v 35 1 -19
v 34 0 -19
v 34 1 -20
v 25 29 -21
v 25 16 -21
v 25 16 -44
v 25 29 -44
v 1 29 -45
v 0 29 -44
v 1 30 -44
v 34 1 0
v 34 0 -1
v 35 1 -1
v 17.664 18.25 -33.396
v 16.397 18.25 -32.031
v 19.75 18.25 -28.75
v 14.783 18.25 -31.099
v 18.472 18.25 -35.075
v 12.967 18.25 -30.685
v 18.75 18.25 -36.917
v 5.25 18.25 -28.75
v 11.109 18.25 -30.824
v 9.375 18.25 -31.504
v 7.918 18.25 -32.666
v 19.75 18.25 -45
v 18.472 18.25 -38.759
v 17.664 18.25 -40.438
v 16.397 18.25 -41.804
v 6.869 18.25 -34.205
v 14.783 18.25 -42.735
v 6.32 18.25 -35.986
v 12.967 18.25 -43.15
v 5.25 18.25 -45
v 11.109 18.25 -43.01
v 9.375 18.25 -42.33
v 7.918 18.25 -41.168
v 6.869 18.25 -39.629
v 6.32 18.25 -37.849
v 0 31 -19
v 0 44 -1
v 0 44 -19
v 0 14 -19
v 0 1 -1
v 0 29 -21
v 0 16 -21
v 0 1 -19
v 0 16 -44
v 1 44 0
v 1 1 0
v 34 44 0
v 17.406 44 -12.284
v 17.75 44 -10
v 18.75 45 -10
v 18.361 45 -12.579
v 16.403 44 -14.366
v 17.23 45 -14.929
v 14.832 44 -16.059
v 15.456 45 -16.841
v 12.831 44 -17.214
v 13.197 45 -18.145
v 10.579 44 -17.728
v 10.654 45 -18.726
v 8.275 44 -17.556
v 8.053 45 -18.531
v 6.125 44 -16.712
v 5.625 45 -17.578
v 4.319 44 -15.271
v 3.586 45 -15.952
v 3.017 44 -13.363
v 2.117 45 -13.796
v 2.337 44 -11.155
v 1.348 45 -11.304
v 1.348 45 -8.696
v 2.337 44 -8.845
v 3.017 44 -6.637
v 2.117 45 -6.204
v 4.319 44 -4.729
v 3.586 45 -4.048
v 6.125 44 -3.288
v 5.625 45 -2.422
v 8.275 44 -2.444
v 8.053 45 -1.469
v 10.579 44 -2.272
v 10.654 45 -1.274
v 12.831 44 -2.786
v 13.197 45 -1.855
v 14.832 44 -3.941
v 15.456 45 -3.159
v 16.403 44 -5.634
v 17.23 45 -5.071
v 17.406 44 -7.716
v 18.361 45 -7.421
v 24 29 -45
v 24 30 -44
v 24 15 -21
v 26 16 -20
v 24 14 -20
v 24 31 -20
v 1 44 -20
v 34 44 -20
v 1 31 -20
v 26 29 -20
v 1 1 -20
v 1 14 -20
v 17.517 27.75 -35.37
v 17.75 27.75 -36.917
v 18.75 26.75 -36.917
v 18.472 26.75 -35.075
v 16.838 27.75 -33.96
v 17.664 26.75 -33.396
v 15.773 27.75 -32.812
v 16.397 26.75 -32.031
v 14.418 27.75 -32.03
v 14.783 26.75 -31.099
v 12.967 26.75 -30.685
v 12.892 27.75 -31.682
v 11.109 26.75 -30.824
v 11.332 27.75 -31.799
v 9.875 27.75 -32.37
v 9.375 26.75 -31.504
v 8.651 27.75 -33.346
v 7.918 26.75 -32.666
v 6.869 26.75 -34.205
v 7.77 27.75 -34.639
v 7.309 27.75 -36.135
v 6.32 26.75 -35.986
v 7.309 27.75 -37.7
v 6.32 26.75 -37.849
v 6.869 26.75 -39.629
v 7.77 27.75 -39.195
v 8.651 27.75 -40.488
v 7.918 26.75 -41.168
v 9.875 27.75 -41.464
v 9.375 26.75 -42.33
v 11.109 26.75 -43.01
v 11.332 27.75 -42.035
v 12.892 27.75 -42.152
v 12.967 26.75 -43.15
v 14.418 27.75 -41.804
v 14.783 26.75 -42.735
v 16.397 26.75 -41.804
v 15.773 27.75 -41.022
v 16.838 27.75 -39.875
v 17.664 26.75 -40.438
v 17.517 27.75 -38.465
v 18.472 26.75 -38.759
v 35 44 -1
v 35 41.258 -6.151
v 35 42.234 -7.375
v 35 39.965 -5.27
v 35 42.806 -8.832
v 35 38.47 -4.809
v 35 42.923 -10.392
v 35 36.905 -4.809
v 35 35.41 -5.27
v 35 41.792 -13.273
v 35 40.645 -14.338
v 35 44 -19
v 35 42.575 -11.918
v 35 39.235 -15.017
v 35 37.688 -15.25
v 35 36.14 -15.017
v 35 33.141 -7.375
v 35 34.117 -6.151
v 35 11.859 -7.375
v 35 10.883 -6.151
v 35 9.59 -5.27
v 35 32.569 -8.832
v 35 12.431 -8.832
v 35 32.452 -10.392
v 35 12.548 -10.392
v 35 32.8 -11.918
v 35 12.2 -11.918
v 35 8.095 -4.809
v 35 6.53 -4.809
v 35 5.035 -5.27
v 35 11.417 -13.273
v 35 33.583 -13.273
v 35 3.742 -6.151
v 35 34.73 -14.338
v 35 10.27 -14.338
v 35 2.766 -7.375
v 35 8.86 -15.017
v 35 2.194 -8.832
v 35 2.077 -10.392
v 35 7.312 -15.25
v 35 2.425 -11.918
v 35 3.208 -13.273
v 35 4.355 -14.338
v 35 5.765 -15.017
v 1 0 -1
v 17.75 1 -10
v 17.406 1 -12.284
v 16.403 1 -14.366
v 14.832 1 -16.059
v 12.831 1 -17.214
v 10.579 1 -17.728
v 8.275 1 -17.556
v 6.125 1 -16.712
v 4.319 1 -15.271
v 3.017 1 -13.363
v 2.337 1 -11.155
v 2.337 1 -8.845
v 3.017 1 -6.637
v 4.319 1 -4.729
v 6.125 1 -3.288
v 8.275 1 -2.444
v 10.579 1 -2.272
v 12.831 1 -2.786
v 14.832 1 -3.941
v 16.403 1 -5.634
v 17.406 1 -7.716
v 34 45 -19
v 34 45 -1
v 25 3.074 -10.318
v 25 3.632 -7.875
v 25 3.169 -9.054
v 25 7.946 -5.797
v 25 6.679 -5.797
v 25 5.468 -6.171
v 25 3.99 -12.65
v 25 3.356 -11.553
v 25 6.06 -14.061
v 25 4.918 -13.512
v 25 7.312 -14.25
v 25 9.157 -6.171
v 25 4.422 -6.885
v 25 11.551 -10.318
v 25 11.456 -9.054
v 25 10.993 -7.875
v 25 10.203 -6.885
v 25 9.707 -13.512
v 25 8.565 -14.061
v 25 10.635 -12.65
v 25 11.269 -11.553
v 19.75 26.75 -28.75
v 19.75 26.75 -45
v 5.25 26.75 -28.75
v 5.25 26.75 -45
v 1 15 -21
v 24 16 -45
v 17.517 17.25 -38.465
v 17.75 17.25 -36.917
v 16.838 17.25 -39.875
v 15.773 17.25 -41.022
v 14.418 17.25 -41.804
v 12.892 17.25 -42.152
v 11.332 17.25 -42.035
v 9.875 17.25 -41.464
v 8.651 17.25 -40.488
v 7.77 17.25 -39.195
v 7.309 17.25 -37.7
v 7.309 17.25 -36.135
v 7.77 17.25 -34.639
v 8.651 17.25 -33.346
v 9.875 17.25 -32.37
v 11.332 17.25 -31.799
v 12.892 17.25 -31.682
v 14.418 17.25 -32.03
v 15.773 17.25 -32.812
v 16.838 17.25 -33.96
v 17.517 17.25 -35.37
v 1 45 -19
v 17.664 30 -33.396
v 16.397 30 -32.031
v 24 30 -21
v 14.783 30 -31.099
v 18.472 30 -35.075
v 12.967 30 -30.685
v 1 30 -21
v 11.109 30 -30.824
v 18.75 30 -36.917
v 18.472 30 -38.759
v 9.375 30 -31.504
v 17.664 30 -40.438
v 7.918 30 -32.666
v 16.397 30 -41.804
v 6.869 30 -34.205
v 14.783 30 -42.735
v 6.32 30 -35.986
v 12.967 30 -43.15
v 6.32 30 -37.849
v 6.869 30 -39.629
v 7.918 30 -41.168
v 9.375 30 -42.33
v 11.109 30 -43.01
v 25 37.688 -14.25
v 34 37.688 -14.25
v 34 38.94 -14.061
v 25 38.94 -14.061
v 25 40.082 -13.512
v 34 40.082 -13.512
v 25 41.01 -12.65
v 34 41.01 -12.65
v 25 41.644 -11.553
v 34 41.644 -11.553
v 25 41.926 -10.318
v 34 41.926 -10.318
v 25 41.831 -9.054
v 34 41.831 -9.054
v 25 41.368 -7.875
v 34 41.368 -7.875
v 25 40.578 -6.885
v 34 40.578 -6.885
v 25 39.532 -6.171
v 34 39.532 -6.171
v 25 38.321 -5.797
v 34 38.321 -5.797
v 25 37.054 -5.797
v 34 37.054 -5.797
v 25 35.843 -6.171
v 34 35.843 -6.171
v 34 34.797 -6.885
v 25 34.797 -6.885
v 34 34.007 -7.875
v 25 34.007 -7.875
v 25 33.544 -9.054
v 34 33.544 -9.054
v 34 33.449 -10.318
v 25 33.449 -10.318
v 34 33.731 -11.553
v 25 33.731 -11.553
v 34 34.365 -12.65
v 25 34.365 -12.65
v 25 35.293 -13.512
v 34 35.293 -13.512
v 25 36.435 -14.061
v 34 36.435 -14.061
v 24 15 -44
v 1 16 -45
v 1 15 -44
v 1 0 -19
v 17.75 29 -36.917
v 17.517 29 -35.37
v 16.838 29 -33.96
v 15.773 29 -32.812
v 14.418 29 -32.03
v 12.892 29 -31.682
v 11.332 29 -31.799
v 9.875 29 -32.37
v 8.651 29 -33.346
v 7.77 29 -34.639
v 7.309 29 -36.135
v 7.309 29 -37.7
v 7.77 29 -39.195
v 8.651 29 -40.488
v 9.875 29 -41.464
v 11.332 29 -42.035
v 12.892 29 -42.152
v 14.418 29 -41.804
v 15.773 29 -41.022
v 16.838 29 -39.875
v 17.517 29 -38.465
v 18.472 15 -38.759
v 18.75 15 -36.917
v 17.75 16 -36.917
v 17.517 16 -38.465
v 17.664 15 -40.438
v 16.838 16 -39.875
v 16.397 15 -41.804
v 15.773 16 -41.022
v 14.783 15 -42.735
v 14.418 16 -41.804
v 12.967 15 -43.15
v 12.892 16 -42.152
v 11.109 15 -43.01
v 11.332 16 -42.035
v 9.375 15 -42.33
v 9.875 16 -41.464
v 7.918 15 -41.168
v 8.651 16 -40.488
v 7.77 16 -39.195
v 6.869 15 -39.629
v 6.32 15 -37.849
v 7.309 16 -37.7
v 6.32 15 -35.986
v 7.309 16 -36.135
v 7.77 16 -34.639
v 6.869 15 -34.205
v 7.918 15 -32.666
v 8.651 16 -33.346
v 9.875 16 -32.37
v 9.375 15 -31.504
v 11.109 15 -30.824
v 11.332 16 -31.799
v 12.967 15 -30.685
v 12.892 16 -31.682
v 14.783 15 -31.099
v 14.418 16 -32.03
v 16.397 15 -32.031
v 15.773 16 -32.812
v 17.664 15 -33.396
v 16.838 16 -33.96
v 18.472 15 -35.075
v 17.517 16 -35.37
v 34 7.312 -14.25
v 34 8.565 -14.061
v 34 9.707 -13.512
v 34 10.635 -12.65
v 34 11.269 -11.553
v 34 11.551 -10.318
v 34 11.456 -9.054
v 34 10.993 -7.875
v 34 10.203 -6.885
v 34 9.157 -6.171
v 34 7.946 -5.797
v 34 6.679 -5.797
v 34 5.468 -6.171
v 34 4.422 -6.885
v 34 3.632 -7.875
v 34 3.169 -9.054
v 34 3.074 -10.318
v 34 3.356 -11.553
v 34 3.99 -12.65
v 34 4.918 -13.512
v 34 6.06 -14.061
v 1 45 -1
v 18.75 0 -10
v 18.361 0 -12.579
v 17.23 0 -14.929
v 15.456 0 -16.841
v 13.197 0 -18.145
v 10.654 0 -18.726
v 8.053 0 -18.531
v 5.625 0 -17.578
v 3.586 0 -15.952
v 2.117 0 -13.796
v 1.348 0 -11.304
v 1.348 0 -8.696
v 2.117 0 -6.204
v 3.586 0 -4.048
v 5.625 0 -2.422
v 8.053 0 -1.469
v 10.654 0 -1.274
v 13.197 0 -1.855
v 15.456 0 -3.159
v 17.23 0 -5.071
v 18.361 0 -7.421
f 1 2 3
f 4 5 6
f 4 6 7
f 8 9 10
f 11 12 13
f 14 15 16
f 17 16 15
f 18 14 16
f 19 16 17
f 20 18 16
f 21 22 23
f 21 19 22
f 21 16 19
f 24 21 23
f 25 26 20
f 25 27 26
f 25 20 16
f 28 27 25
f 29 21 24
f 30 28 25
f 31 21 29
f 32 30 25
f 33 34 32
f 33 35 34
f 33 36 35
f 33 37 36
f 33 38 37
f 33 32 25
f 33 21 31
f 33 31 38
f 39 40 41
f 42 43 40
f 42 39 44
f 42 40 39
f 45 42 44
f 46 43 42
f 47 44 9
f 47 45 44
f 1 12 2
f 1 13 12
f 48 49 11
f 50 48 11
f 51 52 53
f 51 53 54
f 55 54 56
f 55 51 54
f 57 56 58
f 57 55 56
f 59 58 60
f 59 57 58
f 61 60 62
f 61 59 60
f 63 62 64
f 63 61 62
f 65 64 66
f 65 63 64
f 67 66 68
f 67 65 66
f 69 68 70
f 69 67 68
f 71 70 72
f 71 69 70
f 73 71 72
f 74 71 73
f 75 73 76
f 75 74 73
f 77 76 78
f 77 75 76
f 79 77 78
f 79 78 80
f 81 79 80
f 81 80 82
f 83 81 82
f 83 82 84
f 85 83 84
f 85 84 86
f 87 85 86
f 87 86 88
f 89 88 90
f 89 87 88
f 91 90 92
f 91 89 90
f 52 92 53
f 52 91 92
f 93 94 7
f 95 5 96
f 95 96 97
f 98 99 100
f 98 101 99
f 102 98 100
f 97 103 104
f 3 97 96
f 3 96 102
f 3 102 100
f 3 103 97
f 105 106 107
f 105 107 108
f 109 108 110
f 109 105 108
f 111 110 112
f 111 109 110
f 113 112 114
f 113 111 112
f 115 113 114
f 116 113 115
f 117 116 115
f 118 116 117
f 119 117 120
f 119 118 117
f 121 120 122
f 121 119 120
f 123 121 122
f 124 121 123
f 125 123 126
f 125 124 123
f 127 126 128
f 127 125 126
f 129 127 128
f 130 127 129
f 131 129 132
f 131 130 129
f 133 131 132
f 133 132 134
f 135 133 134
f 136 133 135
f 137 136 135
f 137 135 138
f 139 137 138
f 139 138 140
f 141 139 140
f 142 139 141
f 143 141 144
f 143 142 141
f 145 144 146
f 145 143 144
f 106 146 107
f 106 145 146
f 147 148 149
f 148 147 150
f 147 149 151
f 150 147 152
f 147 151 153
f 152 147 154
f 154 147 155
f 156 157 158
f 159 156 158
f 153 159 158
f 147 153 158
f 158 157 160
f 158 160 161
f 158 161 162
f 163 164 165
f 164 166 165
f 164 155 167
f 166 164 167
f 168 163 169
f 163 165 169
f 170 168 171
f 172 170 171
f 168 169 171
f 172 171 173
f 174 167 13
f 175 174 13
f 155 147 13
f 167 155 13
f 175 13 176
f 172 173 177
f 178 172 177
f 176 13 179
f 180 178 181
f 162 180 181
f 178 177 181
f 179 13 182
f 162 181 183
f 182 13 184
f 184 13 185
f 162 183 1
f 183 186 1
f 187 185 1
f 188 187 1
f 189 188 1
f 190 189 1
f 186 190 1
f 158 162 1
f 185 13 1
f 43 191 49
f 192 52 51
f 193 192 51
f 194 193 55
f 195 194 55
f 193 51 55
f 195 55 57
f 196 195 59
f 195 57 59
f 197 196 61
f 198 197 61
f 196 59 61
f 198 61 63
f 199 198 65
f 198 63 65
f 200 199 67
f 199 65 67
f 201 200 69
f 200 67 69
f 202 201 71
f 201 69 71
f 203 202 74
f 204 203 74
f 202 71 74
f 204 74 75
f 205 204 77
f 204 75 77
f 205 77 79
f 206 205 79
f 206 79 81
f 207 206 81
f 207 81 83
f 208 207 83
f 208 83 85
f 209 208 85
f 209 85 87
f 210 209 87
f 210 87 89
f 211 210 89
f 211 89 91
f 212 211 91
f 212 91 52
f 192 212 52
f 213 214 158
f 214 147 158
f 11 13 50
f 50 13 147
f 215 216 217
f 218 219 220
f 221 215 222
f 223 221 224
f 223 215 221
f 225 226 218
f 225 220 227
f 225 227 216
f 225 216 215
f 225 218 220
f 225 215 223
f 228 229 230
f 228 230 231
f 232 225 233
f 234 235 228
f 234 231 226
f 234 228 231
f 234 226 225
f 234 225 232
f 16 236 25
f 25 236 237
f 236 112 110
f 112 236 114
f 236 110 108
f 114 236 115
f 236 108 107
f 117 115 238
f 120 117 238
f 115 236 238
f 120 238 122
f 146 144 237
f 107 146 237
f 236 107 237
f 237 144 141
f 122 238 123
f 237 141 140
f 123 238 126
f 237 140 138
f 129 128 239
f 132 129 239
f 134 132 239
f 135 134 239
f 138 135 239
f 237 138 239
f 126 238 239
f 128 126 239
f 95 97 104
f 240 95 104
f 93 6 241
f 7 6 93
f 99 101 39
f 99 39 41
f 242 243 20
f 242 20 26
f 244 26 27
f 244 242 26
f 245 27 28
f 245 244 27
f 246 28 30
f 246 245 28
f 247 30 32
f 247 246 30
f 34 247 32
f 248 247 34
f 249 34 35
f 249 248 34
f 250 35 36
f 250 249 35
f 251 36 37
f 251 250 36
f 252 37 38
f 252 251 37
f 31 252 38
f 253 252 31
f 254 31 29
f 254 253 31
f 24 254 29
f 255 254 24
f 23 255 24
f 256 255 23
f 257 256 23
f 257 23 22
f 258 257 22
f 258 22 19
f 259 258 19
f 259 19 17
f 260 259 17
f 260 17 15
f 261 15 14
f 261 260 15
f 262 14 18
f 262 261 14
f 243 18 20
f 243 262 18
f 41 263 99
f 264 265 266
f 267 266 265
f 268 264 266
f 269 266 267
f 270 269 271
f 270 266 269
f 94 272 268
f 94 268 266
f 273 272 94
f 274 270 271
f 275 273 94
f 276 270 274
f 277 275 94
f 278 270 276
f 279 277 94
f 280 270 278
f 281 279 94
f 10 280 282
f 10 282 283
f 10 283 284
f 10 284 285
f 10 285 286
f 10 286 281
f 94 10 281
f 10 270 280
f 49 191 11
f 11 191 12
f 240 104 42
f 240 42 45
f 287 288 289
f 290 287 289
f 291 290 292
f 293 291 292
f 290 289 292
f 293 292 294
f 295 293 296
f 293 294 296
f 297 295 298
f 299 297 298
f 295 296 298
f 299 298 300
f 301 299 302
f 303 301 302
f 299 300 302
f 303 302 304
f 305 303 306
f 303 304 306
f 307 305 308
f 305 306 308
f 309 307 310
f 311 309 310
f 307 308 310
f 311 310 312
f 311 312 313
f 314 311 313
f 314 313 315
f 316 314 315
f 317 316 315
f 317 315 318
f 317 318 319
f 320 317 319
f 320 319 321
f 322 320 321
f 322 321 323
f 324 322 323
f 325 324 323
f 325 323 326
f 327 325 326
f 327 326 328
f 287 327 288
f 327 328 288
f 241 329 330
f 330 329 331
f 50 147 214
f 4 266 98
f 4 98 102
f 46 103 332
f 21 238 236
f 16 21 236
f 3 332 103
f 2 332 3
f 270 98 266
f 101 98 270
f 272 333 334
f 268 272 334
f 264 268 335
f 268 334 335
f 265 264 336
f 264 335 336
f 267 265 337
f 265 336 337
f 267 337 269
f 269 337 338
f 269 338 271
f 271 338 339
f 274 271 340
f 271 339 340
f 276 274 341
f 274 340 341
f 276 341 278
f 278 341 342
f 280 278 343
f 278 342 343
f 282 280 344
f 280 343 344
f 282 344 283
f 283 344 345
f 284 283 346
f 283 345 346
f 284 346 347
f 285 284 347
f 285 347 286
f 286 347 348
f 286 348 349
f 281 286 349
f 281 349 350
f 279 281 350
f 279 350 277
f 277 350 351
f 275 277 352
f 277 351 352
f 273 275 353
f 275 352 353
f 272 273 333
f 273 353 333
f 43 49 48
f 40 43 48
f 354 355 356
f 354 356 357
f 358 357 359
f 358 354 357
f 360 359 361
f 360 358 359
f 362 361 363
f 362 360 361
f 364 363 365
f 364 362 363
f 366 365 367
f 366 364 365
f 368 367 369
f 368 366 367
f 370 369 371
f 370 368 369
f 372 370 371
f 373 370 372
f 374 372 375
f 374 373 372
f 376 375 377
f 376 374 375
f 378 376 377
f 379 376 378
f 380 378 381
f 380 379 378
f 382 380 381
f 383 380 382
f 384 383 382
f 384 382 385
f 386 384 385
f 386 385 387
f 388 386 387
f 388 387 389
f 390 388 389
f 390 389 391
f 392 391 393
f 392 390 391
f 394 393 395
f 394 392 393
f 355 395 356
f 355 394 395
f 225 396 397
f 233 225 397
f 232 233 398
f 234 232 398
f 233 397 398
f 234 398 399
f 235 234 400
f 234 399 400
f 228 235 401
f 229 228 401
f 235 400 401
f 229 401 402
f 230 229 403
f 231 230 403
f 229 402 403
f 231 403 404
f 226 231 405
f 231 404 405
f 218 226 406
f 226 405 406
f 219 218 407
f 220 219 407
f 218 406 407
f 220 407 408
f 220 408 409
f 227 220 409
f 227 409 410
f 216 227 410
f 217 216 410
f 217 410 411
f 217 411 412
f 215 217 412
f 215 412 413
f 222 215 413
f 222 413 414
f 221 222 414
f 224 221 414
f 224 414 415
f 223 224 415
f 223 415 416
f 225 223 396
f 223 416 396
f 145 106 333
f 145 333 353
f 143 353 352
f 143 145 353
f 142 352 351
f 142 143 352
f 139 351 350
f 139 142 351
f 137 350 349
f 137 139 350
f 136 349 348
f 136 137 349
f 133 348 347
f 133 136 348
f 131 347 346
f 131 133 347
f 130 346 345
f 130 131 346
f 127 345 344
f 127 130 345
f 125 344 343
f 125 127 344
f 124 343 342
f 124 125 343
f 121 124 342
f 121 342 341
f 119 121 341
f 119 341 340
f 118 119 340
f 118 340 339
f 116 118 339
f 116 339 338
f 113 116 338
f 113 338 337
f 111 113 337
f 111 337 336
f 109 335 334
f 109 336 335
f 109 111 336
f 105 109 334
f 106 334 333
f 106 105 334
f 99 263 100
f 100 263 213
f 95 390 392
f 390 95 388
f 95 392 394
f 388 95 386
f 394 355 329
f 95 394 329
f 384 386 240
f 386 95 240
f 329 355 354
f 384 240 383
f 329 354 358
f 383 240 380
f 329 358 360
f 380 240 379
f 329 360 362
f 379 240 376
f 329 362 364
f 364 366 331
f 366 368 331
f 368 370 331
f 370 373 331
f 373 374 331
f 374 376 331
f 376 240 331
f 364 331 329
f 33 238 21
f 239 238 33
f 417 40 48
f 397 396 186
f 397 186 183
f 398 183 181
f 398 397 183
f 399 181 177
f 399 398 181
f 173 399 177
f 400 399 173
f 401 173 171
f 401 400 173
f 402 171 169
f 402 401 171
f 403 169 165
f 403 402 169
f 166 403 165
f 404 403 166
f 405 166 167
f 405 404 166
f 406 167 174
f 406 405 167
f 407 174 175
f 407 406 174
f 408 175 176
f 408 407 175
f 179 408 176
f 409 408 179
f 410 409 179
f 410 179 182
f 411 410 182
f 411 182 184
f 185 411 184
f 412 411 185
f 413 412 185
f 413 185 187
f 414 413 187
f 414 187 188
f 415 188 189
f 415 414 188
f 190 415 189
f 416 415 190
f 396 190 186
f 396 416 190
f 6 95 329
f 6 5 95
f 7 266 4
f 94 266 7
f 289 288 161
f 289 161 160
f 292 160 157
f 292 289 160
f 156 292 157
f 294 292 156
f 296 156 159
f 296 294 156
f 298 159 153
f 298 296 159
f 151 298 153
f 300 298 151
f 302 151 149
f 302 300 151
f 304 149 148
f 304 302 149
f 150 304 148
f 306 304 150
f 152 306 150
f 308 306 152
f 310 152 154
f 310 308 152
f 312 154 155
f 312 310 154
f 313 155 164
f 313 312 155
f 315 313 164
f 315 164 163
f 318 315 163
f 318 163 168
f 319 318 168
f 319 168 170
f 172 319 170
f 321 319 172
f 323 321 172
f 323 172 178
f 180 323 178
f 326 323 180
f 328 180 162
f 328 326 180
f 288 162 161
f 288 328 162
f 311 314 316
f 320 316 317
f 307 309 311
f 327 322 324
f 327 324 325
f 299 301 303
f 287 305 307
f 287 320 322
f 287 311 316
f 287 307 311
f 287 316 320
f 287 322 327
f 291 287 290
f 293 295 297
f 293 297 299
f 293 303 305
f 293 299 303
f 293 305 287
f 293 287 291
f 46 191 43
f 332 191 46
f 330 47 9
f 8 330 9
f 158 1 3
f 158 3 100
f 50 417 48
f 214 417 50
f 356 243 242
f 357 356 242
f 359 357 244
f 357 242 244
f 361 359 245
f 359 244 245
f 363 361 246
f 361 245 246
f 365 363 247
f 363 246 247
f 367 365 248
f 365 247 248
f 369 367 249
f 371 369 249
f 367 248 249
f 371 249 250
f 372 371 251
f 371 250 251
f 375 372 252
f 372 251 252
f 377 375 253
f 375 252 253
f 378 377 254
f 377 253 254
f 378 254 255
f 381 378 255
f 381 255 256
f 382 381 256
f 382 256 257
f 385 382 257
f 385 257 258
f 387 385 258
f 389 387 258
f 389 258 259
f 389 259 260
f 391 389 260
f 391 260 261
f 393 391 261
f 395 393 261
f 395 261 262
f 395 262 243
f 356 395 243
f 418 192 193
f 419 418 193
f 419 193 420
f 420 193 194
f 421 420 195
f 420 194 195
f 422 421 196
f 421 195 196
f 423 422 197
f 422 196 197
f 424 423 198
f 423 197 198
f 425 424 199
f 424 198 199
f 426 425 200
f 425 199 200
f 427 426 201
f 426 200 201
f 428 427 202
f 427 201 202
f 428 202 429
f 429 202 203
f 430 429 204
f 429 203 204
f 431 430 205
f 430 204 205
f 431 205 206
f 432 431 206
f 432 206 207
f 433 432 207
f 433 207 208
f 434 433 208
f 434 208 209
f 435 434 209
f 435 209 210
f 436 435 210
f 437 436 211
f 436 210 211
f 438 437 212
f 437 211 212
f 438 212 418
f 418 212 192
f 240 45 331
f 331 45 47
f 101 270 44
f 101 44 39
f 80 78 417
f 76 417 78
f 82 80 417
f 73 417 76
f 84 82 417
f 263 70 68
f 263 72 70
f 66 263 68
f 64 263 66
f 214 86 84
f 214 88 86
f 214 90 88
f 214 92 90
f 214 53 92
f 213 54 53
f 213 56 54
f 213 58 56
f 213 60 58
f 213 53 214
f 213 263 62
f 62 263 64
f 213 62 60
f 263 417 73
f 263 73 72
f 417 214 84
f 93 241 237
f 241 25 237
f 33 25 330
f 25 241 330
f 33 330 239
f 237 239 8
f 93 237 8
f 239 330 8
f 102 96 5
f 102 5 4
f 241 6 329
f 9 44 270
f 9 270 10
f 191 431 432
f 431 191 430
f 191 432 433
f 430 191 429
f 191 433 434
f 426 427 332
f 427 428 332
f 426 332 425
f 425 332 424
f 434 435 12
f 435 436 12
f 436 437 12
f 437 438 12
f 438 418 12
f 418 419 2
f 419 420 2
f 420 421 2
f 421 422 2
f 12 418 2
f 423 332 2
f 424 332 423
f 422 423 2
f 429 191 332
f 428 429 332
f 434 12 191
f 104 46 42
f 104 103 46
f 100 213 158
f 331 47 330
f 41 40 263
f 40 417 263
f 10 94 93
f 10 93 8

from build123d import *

# Parameters (mm, degrees)
SKETCH1_W               = 35
SKETCH1_H               = 20
BOSS_EXTRUDE1_DEPTH     = 45
SKETCH2_R               = 7.75
CUT_EXTRUDE1_DEPTH      = 46
SKETCH3_R               = 4.25
CUT_EXTRUDE2_DEPTH      = 10
SKETCH4_W               = 25
SKETCH4_H               = 15
BOSS_EXTRUDE2_DEPTH     = 25
SKETCH5_W               = 14.5
SKETCH5_H               = 16.25
CUT_EXTRUDE3_DEPTH      = 31
BOSS_EXTRUDE3_REACH     = 31.75
SKETCH6_W               = 16.25
SKETCH6_H               = 3.25
SKETCH7_R               = 5.25
CUT_EXTRUDE4_DEPTH      = 27.75
CUT_EXTRUDE4_DEPTH_BACK = 19.25
CHAMFER1_SIZE           = 1
CHAMFER2_SIZE           = 1


with BuildPart() as part:
    # Sketch1 → Boss-Extrude1 (new body)
    with BuildSketch(Plane(origin=(0, 0, 0), x_dir=(1, 0, 0), z_dir=(0, 1, 0))):
        with Locations((17.5, 10)):
            Rectangle(SKETCH1_W, SKETCH1_H)
    extrude(amount=BOSS_EXTRUDE1_DEPTH)

    # Sketch2 → Cut-Extrude1 (cut, through all)
    with BuildSketch(Plane(origin=(0, 45, 0), x_dir=(1, 0, 0), z_dir=(0, 1, 0))):
        with Locations((10, 10)):
            Circle(SKETCH2_R)
    extrude(amount=-CUT_EXTRUDE1_DEPTH, mode=Mode.SUBTRACT)

    # Sketch3 → Cut-Extrude2 (cut)
    with BuildSketch(Plane(origin=(35, 0, 0), x_dir=(0, 0, -1), z_dir=(1, 0, 0))):
        with Locations((10, 37.6875)):
            Circle(SKETCH3_R)
        with Locations((10, 7.3125)):
            Circle(SKETCH3_R)
    extrude(amount=-CUT_EXTRUDE2_DEPTH, mode=Mode.SUBTRACT)

    # Sketch4 → Boss-Extrude2 (add)
    with BuildSketch(Plane(origin=(0, 0, -20), x_dir=(-1, 0, 0), z_dir=(0, 0, -1))):
        with Locations((-12.5, 22.5)):
            Rectangle(SKETCH4_W, SKETCH4_H)
    extrude(amount=BOSS_EXTRUDE2_DEPTH)

    # Sketch5 → Cut-Extrude3 (cut, through all)
    with BuildSketch(Plane(origin=(0, 30, 0), x_dir=(1, 0, 0), z_dir=(0, 1, 0))):
        with Locations((12.5, 36.875)):
            Rectangle(SKETCH5_W, SKETCH5_H)
    extrude(amount=-CUT_EXTRUDE3_DEPTH, mode=Mode.SUBTRACT)

    # Sketch6 → Boss-Extrude3 (add, up to next)
    with BuildSketch(Plane(origin=(5.25, 0, 0), x_dir=(0, 0, -1), z_dir=(1, 0, 0)), mode=Mode.PRIVATE) as boss_extrude3_sk1:
        with Locations((36.875, 28.375)):
            Rectangle(SKETCH6_W, SKETCH6_H)
    boss_extrude3_tool1 = extrude(boss_extrude3_sk1.sketch, amount=BOSS_EXTRUDE3_REACH, mode=Mode.PRIVATE) - part.part
    add(boss_extrude3_tool1.solids().sort_by_distance((5.25, 28.375, -36.875))[0])
    # Sketch6 → Boss-Extrude3 (add, up to next)
    with BuildSketch(Plane(origin=(5.25, 0, 0), x_dir=(0, 0, -1), z_dir=(1, 0, 0)), mode=Mode.PRIVATE) as boss_extrude3_sk2:
        with Locations((36.875, 16.625)):
            Rectangle(SKETCH6_W, SKETCH6_H)
    boss_extrude3_tool2 = extrude(boss_extrude3_sk2.sketch, amount=BOSS_EXTRUDE3_REACH, mode=Mode.PRIVATE) - part.part
    add(boss_extrude3_tool2.solids().sort_by_distance((5.25, 16.625, -36.875))[0])

    # Sketch7 → Cut-Extrude4 (cut, two sides)
    with BuildSketch(Plane(origin=(0, 18.25, 0), x_dir=(1, 0, 0), z_dir=(0, 1, 0))) as cut_extrude4_sk:
        with Locations((12.5, 36.917096231)):
            Circle(SKETCH7_R)
    extrude(amount=CUT_EXTRUDE4_DEPTH, mode=Mode.SUBTRACT)
    extrude(cut_extrude4_sk.sketch, amount=-CUT_EXTRUDE4_DEPTH_BACK, mode=Mode.SUBTRACT)

    # Chamfer1
    chamfer1_edges = [part.edges().sort_by_distance(p)[0] for p in [
        (35, 45, -10),
        (2.25, 0, -10),
        (2.25, 45, -10),
        (17.5, 45, -20),
        (0, 7.5, -20),
        (0, 15, -32.5),
        (12.5, 30, -20),
        (0, 30, -32.5),
        (25, 22.5, -20),
        (25, 30, -32.5),
        (12.5, 15, -20),
        (25, 15, -32.5),
        (0, 22.5, -45),
        (12.5, 30, -45),
        (25, 22.5, -45),
        (12.5, 15, -45),
        (0, 45, -10),
        (17.5, 0, -20),
        (35, 0, -10),
        (17.5, 0, 0),
        (0, 0, -10),
        (0, 37.5, -20),
        (35, 22.5, -20),
        (35, 22.5, 0),
        (0, 22.5, 0),
        (7.25, 26.75, -36.917096231),
        (7.25, 30, -36.917096231),
        (7.25, 18.25, -36.917096231),
        (7.25, 15, -36.917096231),
        (17.5, 45, 0),
    ]]
    chamfer(chamfer1_edges, length=CHAMFER1_SIZE)

    # Chamfer2
    chamfer2_edges = [part.edges().sort_by_distance(p)[0] for p in [
        (35, 37.6875, -5.75),
        (35, 7.3125, -5.75),
    ]]
    chamfer(chamfer2_edges, length=CHAMFER2_SIZE)


solid = part.part
